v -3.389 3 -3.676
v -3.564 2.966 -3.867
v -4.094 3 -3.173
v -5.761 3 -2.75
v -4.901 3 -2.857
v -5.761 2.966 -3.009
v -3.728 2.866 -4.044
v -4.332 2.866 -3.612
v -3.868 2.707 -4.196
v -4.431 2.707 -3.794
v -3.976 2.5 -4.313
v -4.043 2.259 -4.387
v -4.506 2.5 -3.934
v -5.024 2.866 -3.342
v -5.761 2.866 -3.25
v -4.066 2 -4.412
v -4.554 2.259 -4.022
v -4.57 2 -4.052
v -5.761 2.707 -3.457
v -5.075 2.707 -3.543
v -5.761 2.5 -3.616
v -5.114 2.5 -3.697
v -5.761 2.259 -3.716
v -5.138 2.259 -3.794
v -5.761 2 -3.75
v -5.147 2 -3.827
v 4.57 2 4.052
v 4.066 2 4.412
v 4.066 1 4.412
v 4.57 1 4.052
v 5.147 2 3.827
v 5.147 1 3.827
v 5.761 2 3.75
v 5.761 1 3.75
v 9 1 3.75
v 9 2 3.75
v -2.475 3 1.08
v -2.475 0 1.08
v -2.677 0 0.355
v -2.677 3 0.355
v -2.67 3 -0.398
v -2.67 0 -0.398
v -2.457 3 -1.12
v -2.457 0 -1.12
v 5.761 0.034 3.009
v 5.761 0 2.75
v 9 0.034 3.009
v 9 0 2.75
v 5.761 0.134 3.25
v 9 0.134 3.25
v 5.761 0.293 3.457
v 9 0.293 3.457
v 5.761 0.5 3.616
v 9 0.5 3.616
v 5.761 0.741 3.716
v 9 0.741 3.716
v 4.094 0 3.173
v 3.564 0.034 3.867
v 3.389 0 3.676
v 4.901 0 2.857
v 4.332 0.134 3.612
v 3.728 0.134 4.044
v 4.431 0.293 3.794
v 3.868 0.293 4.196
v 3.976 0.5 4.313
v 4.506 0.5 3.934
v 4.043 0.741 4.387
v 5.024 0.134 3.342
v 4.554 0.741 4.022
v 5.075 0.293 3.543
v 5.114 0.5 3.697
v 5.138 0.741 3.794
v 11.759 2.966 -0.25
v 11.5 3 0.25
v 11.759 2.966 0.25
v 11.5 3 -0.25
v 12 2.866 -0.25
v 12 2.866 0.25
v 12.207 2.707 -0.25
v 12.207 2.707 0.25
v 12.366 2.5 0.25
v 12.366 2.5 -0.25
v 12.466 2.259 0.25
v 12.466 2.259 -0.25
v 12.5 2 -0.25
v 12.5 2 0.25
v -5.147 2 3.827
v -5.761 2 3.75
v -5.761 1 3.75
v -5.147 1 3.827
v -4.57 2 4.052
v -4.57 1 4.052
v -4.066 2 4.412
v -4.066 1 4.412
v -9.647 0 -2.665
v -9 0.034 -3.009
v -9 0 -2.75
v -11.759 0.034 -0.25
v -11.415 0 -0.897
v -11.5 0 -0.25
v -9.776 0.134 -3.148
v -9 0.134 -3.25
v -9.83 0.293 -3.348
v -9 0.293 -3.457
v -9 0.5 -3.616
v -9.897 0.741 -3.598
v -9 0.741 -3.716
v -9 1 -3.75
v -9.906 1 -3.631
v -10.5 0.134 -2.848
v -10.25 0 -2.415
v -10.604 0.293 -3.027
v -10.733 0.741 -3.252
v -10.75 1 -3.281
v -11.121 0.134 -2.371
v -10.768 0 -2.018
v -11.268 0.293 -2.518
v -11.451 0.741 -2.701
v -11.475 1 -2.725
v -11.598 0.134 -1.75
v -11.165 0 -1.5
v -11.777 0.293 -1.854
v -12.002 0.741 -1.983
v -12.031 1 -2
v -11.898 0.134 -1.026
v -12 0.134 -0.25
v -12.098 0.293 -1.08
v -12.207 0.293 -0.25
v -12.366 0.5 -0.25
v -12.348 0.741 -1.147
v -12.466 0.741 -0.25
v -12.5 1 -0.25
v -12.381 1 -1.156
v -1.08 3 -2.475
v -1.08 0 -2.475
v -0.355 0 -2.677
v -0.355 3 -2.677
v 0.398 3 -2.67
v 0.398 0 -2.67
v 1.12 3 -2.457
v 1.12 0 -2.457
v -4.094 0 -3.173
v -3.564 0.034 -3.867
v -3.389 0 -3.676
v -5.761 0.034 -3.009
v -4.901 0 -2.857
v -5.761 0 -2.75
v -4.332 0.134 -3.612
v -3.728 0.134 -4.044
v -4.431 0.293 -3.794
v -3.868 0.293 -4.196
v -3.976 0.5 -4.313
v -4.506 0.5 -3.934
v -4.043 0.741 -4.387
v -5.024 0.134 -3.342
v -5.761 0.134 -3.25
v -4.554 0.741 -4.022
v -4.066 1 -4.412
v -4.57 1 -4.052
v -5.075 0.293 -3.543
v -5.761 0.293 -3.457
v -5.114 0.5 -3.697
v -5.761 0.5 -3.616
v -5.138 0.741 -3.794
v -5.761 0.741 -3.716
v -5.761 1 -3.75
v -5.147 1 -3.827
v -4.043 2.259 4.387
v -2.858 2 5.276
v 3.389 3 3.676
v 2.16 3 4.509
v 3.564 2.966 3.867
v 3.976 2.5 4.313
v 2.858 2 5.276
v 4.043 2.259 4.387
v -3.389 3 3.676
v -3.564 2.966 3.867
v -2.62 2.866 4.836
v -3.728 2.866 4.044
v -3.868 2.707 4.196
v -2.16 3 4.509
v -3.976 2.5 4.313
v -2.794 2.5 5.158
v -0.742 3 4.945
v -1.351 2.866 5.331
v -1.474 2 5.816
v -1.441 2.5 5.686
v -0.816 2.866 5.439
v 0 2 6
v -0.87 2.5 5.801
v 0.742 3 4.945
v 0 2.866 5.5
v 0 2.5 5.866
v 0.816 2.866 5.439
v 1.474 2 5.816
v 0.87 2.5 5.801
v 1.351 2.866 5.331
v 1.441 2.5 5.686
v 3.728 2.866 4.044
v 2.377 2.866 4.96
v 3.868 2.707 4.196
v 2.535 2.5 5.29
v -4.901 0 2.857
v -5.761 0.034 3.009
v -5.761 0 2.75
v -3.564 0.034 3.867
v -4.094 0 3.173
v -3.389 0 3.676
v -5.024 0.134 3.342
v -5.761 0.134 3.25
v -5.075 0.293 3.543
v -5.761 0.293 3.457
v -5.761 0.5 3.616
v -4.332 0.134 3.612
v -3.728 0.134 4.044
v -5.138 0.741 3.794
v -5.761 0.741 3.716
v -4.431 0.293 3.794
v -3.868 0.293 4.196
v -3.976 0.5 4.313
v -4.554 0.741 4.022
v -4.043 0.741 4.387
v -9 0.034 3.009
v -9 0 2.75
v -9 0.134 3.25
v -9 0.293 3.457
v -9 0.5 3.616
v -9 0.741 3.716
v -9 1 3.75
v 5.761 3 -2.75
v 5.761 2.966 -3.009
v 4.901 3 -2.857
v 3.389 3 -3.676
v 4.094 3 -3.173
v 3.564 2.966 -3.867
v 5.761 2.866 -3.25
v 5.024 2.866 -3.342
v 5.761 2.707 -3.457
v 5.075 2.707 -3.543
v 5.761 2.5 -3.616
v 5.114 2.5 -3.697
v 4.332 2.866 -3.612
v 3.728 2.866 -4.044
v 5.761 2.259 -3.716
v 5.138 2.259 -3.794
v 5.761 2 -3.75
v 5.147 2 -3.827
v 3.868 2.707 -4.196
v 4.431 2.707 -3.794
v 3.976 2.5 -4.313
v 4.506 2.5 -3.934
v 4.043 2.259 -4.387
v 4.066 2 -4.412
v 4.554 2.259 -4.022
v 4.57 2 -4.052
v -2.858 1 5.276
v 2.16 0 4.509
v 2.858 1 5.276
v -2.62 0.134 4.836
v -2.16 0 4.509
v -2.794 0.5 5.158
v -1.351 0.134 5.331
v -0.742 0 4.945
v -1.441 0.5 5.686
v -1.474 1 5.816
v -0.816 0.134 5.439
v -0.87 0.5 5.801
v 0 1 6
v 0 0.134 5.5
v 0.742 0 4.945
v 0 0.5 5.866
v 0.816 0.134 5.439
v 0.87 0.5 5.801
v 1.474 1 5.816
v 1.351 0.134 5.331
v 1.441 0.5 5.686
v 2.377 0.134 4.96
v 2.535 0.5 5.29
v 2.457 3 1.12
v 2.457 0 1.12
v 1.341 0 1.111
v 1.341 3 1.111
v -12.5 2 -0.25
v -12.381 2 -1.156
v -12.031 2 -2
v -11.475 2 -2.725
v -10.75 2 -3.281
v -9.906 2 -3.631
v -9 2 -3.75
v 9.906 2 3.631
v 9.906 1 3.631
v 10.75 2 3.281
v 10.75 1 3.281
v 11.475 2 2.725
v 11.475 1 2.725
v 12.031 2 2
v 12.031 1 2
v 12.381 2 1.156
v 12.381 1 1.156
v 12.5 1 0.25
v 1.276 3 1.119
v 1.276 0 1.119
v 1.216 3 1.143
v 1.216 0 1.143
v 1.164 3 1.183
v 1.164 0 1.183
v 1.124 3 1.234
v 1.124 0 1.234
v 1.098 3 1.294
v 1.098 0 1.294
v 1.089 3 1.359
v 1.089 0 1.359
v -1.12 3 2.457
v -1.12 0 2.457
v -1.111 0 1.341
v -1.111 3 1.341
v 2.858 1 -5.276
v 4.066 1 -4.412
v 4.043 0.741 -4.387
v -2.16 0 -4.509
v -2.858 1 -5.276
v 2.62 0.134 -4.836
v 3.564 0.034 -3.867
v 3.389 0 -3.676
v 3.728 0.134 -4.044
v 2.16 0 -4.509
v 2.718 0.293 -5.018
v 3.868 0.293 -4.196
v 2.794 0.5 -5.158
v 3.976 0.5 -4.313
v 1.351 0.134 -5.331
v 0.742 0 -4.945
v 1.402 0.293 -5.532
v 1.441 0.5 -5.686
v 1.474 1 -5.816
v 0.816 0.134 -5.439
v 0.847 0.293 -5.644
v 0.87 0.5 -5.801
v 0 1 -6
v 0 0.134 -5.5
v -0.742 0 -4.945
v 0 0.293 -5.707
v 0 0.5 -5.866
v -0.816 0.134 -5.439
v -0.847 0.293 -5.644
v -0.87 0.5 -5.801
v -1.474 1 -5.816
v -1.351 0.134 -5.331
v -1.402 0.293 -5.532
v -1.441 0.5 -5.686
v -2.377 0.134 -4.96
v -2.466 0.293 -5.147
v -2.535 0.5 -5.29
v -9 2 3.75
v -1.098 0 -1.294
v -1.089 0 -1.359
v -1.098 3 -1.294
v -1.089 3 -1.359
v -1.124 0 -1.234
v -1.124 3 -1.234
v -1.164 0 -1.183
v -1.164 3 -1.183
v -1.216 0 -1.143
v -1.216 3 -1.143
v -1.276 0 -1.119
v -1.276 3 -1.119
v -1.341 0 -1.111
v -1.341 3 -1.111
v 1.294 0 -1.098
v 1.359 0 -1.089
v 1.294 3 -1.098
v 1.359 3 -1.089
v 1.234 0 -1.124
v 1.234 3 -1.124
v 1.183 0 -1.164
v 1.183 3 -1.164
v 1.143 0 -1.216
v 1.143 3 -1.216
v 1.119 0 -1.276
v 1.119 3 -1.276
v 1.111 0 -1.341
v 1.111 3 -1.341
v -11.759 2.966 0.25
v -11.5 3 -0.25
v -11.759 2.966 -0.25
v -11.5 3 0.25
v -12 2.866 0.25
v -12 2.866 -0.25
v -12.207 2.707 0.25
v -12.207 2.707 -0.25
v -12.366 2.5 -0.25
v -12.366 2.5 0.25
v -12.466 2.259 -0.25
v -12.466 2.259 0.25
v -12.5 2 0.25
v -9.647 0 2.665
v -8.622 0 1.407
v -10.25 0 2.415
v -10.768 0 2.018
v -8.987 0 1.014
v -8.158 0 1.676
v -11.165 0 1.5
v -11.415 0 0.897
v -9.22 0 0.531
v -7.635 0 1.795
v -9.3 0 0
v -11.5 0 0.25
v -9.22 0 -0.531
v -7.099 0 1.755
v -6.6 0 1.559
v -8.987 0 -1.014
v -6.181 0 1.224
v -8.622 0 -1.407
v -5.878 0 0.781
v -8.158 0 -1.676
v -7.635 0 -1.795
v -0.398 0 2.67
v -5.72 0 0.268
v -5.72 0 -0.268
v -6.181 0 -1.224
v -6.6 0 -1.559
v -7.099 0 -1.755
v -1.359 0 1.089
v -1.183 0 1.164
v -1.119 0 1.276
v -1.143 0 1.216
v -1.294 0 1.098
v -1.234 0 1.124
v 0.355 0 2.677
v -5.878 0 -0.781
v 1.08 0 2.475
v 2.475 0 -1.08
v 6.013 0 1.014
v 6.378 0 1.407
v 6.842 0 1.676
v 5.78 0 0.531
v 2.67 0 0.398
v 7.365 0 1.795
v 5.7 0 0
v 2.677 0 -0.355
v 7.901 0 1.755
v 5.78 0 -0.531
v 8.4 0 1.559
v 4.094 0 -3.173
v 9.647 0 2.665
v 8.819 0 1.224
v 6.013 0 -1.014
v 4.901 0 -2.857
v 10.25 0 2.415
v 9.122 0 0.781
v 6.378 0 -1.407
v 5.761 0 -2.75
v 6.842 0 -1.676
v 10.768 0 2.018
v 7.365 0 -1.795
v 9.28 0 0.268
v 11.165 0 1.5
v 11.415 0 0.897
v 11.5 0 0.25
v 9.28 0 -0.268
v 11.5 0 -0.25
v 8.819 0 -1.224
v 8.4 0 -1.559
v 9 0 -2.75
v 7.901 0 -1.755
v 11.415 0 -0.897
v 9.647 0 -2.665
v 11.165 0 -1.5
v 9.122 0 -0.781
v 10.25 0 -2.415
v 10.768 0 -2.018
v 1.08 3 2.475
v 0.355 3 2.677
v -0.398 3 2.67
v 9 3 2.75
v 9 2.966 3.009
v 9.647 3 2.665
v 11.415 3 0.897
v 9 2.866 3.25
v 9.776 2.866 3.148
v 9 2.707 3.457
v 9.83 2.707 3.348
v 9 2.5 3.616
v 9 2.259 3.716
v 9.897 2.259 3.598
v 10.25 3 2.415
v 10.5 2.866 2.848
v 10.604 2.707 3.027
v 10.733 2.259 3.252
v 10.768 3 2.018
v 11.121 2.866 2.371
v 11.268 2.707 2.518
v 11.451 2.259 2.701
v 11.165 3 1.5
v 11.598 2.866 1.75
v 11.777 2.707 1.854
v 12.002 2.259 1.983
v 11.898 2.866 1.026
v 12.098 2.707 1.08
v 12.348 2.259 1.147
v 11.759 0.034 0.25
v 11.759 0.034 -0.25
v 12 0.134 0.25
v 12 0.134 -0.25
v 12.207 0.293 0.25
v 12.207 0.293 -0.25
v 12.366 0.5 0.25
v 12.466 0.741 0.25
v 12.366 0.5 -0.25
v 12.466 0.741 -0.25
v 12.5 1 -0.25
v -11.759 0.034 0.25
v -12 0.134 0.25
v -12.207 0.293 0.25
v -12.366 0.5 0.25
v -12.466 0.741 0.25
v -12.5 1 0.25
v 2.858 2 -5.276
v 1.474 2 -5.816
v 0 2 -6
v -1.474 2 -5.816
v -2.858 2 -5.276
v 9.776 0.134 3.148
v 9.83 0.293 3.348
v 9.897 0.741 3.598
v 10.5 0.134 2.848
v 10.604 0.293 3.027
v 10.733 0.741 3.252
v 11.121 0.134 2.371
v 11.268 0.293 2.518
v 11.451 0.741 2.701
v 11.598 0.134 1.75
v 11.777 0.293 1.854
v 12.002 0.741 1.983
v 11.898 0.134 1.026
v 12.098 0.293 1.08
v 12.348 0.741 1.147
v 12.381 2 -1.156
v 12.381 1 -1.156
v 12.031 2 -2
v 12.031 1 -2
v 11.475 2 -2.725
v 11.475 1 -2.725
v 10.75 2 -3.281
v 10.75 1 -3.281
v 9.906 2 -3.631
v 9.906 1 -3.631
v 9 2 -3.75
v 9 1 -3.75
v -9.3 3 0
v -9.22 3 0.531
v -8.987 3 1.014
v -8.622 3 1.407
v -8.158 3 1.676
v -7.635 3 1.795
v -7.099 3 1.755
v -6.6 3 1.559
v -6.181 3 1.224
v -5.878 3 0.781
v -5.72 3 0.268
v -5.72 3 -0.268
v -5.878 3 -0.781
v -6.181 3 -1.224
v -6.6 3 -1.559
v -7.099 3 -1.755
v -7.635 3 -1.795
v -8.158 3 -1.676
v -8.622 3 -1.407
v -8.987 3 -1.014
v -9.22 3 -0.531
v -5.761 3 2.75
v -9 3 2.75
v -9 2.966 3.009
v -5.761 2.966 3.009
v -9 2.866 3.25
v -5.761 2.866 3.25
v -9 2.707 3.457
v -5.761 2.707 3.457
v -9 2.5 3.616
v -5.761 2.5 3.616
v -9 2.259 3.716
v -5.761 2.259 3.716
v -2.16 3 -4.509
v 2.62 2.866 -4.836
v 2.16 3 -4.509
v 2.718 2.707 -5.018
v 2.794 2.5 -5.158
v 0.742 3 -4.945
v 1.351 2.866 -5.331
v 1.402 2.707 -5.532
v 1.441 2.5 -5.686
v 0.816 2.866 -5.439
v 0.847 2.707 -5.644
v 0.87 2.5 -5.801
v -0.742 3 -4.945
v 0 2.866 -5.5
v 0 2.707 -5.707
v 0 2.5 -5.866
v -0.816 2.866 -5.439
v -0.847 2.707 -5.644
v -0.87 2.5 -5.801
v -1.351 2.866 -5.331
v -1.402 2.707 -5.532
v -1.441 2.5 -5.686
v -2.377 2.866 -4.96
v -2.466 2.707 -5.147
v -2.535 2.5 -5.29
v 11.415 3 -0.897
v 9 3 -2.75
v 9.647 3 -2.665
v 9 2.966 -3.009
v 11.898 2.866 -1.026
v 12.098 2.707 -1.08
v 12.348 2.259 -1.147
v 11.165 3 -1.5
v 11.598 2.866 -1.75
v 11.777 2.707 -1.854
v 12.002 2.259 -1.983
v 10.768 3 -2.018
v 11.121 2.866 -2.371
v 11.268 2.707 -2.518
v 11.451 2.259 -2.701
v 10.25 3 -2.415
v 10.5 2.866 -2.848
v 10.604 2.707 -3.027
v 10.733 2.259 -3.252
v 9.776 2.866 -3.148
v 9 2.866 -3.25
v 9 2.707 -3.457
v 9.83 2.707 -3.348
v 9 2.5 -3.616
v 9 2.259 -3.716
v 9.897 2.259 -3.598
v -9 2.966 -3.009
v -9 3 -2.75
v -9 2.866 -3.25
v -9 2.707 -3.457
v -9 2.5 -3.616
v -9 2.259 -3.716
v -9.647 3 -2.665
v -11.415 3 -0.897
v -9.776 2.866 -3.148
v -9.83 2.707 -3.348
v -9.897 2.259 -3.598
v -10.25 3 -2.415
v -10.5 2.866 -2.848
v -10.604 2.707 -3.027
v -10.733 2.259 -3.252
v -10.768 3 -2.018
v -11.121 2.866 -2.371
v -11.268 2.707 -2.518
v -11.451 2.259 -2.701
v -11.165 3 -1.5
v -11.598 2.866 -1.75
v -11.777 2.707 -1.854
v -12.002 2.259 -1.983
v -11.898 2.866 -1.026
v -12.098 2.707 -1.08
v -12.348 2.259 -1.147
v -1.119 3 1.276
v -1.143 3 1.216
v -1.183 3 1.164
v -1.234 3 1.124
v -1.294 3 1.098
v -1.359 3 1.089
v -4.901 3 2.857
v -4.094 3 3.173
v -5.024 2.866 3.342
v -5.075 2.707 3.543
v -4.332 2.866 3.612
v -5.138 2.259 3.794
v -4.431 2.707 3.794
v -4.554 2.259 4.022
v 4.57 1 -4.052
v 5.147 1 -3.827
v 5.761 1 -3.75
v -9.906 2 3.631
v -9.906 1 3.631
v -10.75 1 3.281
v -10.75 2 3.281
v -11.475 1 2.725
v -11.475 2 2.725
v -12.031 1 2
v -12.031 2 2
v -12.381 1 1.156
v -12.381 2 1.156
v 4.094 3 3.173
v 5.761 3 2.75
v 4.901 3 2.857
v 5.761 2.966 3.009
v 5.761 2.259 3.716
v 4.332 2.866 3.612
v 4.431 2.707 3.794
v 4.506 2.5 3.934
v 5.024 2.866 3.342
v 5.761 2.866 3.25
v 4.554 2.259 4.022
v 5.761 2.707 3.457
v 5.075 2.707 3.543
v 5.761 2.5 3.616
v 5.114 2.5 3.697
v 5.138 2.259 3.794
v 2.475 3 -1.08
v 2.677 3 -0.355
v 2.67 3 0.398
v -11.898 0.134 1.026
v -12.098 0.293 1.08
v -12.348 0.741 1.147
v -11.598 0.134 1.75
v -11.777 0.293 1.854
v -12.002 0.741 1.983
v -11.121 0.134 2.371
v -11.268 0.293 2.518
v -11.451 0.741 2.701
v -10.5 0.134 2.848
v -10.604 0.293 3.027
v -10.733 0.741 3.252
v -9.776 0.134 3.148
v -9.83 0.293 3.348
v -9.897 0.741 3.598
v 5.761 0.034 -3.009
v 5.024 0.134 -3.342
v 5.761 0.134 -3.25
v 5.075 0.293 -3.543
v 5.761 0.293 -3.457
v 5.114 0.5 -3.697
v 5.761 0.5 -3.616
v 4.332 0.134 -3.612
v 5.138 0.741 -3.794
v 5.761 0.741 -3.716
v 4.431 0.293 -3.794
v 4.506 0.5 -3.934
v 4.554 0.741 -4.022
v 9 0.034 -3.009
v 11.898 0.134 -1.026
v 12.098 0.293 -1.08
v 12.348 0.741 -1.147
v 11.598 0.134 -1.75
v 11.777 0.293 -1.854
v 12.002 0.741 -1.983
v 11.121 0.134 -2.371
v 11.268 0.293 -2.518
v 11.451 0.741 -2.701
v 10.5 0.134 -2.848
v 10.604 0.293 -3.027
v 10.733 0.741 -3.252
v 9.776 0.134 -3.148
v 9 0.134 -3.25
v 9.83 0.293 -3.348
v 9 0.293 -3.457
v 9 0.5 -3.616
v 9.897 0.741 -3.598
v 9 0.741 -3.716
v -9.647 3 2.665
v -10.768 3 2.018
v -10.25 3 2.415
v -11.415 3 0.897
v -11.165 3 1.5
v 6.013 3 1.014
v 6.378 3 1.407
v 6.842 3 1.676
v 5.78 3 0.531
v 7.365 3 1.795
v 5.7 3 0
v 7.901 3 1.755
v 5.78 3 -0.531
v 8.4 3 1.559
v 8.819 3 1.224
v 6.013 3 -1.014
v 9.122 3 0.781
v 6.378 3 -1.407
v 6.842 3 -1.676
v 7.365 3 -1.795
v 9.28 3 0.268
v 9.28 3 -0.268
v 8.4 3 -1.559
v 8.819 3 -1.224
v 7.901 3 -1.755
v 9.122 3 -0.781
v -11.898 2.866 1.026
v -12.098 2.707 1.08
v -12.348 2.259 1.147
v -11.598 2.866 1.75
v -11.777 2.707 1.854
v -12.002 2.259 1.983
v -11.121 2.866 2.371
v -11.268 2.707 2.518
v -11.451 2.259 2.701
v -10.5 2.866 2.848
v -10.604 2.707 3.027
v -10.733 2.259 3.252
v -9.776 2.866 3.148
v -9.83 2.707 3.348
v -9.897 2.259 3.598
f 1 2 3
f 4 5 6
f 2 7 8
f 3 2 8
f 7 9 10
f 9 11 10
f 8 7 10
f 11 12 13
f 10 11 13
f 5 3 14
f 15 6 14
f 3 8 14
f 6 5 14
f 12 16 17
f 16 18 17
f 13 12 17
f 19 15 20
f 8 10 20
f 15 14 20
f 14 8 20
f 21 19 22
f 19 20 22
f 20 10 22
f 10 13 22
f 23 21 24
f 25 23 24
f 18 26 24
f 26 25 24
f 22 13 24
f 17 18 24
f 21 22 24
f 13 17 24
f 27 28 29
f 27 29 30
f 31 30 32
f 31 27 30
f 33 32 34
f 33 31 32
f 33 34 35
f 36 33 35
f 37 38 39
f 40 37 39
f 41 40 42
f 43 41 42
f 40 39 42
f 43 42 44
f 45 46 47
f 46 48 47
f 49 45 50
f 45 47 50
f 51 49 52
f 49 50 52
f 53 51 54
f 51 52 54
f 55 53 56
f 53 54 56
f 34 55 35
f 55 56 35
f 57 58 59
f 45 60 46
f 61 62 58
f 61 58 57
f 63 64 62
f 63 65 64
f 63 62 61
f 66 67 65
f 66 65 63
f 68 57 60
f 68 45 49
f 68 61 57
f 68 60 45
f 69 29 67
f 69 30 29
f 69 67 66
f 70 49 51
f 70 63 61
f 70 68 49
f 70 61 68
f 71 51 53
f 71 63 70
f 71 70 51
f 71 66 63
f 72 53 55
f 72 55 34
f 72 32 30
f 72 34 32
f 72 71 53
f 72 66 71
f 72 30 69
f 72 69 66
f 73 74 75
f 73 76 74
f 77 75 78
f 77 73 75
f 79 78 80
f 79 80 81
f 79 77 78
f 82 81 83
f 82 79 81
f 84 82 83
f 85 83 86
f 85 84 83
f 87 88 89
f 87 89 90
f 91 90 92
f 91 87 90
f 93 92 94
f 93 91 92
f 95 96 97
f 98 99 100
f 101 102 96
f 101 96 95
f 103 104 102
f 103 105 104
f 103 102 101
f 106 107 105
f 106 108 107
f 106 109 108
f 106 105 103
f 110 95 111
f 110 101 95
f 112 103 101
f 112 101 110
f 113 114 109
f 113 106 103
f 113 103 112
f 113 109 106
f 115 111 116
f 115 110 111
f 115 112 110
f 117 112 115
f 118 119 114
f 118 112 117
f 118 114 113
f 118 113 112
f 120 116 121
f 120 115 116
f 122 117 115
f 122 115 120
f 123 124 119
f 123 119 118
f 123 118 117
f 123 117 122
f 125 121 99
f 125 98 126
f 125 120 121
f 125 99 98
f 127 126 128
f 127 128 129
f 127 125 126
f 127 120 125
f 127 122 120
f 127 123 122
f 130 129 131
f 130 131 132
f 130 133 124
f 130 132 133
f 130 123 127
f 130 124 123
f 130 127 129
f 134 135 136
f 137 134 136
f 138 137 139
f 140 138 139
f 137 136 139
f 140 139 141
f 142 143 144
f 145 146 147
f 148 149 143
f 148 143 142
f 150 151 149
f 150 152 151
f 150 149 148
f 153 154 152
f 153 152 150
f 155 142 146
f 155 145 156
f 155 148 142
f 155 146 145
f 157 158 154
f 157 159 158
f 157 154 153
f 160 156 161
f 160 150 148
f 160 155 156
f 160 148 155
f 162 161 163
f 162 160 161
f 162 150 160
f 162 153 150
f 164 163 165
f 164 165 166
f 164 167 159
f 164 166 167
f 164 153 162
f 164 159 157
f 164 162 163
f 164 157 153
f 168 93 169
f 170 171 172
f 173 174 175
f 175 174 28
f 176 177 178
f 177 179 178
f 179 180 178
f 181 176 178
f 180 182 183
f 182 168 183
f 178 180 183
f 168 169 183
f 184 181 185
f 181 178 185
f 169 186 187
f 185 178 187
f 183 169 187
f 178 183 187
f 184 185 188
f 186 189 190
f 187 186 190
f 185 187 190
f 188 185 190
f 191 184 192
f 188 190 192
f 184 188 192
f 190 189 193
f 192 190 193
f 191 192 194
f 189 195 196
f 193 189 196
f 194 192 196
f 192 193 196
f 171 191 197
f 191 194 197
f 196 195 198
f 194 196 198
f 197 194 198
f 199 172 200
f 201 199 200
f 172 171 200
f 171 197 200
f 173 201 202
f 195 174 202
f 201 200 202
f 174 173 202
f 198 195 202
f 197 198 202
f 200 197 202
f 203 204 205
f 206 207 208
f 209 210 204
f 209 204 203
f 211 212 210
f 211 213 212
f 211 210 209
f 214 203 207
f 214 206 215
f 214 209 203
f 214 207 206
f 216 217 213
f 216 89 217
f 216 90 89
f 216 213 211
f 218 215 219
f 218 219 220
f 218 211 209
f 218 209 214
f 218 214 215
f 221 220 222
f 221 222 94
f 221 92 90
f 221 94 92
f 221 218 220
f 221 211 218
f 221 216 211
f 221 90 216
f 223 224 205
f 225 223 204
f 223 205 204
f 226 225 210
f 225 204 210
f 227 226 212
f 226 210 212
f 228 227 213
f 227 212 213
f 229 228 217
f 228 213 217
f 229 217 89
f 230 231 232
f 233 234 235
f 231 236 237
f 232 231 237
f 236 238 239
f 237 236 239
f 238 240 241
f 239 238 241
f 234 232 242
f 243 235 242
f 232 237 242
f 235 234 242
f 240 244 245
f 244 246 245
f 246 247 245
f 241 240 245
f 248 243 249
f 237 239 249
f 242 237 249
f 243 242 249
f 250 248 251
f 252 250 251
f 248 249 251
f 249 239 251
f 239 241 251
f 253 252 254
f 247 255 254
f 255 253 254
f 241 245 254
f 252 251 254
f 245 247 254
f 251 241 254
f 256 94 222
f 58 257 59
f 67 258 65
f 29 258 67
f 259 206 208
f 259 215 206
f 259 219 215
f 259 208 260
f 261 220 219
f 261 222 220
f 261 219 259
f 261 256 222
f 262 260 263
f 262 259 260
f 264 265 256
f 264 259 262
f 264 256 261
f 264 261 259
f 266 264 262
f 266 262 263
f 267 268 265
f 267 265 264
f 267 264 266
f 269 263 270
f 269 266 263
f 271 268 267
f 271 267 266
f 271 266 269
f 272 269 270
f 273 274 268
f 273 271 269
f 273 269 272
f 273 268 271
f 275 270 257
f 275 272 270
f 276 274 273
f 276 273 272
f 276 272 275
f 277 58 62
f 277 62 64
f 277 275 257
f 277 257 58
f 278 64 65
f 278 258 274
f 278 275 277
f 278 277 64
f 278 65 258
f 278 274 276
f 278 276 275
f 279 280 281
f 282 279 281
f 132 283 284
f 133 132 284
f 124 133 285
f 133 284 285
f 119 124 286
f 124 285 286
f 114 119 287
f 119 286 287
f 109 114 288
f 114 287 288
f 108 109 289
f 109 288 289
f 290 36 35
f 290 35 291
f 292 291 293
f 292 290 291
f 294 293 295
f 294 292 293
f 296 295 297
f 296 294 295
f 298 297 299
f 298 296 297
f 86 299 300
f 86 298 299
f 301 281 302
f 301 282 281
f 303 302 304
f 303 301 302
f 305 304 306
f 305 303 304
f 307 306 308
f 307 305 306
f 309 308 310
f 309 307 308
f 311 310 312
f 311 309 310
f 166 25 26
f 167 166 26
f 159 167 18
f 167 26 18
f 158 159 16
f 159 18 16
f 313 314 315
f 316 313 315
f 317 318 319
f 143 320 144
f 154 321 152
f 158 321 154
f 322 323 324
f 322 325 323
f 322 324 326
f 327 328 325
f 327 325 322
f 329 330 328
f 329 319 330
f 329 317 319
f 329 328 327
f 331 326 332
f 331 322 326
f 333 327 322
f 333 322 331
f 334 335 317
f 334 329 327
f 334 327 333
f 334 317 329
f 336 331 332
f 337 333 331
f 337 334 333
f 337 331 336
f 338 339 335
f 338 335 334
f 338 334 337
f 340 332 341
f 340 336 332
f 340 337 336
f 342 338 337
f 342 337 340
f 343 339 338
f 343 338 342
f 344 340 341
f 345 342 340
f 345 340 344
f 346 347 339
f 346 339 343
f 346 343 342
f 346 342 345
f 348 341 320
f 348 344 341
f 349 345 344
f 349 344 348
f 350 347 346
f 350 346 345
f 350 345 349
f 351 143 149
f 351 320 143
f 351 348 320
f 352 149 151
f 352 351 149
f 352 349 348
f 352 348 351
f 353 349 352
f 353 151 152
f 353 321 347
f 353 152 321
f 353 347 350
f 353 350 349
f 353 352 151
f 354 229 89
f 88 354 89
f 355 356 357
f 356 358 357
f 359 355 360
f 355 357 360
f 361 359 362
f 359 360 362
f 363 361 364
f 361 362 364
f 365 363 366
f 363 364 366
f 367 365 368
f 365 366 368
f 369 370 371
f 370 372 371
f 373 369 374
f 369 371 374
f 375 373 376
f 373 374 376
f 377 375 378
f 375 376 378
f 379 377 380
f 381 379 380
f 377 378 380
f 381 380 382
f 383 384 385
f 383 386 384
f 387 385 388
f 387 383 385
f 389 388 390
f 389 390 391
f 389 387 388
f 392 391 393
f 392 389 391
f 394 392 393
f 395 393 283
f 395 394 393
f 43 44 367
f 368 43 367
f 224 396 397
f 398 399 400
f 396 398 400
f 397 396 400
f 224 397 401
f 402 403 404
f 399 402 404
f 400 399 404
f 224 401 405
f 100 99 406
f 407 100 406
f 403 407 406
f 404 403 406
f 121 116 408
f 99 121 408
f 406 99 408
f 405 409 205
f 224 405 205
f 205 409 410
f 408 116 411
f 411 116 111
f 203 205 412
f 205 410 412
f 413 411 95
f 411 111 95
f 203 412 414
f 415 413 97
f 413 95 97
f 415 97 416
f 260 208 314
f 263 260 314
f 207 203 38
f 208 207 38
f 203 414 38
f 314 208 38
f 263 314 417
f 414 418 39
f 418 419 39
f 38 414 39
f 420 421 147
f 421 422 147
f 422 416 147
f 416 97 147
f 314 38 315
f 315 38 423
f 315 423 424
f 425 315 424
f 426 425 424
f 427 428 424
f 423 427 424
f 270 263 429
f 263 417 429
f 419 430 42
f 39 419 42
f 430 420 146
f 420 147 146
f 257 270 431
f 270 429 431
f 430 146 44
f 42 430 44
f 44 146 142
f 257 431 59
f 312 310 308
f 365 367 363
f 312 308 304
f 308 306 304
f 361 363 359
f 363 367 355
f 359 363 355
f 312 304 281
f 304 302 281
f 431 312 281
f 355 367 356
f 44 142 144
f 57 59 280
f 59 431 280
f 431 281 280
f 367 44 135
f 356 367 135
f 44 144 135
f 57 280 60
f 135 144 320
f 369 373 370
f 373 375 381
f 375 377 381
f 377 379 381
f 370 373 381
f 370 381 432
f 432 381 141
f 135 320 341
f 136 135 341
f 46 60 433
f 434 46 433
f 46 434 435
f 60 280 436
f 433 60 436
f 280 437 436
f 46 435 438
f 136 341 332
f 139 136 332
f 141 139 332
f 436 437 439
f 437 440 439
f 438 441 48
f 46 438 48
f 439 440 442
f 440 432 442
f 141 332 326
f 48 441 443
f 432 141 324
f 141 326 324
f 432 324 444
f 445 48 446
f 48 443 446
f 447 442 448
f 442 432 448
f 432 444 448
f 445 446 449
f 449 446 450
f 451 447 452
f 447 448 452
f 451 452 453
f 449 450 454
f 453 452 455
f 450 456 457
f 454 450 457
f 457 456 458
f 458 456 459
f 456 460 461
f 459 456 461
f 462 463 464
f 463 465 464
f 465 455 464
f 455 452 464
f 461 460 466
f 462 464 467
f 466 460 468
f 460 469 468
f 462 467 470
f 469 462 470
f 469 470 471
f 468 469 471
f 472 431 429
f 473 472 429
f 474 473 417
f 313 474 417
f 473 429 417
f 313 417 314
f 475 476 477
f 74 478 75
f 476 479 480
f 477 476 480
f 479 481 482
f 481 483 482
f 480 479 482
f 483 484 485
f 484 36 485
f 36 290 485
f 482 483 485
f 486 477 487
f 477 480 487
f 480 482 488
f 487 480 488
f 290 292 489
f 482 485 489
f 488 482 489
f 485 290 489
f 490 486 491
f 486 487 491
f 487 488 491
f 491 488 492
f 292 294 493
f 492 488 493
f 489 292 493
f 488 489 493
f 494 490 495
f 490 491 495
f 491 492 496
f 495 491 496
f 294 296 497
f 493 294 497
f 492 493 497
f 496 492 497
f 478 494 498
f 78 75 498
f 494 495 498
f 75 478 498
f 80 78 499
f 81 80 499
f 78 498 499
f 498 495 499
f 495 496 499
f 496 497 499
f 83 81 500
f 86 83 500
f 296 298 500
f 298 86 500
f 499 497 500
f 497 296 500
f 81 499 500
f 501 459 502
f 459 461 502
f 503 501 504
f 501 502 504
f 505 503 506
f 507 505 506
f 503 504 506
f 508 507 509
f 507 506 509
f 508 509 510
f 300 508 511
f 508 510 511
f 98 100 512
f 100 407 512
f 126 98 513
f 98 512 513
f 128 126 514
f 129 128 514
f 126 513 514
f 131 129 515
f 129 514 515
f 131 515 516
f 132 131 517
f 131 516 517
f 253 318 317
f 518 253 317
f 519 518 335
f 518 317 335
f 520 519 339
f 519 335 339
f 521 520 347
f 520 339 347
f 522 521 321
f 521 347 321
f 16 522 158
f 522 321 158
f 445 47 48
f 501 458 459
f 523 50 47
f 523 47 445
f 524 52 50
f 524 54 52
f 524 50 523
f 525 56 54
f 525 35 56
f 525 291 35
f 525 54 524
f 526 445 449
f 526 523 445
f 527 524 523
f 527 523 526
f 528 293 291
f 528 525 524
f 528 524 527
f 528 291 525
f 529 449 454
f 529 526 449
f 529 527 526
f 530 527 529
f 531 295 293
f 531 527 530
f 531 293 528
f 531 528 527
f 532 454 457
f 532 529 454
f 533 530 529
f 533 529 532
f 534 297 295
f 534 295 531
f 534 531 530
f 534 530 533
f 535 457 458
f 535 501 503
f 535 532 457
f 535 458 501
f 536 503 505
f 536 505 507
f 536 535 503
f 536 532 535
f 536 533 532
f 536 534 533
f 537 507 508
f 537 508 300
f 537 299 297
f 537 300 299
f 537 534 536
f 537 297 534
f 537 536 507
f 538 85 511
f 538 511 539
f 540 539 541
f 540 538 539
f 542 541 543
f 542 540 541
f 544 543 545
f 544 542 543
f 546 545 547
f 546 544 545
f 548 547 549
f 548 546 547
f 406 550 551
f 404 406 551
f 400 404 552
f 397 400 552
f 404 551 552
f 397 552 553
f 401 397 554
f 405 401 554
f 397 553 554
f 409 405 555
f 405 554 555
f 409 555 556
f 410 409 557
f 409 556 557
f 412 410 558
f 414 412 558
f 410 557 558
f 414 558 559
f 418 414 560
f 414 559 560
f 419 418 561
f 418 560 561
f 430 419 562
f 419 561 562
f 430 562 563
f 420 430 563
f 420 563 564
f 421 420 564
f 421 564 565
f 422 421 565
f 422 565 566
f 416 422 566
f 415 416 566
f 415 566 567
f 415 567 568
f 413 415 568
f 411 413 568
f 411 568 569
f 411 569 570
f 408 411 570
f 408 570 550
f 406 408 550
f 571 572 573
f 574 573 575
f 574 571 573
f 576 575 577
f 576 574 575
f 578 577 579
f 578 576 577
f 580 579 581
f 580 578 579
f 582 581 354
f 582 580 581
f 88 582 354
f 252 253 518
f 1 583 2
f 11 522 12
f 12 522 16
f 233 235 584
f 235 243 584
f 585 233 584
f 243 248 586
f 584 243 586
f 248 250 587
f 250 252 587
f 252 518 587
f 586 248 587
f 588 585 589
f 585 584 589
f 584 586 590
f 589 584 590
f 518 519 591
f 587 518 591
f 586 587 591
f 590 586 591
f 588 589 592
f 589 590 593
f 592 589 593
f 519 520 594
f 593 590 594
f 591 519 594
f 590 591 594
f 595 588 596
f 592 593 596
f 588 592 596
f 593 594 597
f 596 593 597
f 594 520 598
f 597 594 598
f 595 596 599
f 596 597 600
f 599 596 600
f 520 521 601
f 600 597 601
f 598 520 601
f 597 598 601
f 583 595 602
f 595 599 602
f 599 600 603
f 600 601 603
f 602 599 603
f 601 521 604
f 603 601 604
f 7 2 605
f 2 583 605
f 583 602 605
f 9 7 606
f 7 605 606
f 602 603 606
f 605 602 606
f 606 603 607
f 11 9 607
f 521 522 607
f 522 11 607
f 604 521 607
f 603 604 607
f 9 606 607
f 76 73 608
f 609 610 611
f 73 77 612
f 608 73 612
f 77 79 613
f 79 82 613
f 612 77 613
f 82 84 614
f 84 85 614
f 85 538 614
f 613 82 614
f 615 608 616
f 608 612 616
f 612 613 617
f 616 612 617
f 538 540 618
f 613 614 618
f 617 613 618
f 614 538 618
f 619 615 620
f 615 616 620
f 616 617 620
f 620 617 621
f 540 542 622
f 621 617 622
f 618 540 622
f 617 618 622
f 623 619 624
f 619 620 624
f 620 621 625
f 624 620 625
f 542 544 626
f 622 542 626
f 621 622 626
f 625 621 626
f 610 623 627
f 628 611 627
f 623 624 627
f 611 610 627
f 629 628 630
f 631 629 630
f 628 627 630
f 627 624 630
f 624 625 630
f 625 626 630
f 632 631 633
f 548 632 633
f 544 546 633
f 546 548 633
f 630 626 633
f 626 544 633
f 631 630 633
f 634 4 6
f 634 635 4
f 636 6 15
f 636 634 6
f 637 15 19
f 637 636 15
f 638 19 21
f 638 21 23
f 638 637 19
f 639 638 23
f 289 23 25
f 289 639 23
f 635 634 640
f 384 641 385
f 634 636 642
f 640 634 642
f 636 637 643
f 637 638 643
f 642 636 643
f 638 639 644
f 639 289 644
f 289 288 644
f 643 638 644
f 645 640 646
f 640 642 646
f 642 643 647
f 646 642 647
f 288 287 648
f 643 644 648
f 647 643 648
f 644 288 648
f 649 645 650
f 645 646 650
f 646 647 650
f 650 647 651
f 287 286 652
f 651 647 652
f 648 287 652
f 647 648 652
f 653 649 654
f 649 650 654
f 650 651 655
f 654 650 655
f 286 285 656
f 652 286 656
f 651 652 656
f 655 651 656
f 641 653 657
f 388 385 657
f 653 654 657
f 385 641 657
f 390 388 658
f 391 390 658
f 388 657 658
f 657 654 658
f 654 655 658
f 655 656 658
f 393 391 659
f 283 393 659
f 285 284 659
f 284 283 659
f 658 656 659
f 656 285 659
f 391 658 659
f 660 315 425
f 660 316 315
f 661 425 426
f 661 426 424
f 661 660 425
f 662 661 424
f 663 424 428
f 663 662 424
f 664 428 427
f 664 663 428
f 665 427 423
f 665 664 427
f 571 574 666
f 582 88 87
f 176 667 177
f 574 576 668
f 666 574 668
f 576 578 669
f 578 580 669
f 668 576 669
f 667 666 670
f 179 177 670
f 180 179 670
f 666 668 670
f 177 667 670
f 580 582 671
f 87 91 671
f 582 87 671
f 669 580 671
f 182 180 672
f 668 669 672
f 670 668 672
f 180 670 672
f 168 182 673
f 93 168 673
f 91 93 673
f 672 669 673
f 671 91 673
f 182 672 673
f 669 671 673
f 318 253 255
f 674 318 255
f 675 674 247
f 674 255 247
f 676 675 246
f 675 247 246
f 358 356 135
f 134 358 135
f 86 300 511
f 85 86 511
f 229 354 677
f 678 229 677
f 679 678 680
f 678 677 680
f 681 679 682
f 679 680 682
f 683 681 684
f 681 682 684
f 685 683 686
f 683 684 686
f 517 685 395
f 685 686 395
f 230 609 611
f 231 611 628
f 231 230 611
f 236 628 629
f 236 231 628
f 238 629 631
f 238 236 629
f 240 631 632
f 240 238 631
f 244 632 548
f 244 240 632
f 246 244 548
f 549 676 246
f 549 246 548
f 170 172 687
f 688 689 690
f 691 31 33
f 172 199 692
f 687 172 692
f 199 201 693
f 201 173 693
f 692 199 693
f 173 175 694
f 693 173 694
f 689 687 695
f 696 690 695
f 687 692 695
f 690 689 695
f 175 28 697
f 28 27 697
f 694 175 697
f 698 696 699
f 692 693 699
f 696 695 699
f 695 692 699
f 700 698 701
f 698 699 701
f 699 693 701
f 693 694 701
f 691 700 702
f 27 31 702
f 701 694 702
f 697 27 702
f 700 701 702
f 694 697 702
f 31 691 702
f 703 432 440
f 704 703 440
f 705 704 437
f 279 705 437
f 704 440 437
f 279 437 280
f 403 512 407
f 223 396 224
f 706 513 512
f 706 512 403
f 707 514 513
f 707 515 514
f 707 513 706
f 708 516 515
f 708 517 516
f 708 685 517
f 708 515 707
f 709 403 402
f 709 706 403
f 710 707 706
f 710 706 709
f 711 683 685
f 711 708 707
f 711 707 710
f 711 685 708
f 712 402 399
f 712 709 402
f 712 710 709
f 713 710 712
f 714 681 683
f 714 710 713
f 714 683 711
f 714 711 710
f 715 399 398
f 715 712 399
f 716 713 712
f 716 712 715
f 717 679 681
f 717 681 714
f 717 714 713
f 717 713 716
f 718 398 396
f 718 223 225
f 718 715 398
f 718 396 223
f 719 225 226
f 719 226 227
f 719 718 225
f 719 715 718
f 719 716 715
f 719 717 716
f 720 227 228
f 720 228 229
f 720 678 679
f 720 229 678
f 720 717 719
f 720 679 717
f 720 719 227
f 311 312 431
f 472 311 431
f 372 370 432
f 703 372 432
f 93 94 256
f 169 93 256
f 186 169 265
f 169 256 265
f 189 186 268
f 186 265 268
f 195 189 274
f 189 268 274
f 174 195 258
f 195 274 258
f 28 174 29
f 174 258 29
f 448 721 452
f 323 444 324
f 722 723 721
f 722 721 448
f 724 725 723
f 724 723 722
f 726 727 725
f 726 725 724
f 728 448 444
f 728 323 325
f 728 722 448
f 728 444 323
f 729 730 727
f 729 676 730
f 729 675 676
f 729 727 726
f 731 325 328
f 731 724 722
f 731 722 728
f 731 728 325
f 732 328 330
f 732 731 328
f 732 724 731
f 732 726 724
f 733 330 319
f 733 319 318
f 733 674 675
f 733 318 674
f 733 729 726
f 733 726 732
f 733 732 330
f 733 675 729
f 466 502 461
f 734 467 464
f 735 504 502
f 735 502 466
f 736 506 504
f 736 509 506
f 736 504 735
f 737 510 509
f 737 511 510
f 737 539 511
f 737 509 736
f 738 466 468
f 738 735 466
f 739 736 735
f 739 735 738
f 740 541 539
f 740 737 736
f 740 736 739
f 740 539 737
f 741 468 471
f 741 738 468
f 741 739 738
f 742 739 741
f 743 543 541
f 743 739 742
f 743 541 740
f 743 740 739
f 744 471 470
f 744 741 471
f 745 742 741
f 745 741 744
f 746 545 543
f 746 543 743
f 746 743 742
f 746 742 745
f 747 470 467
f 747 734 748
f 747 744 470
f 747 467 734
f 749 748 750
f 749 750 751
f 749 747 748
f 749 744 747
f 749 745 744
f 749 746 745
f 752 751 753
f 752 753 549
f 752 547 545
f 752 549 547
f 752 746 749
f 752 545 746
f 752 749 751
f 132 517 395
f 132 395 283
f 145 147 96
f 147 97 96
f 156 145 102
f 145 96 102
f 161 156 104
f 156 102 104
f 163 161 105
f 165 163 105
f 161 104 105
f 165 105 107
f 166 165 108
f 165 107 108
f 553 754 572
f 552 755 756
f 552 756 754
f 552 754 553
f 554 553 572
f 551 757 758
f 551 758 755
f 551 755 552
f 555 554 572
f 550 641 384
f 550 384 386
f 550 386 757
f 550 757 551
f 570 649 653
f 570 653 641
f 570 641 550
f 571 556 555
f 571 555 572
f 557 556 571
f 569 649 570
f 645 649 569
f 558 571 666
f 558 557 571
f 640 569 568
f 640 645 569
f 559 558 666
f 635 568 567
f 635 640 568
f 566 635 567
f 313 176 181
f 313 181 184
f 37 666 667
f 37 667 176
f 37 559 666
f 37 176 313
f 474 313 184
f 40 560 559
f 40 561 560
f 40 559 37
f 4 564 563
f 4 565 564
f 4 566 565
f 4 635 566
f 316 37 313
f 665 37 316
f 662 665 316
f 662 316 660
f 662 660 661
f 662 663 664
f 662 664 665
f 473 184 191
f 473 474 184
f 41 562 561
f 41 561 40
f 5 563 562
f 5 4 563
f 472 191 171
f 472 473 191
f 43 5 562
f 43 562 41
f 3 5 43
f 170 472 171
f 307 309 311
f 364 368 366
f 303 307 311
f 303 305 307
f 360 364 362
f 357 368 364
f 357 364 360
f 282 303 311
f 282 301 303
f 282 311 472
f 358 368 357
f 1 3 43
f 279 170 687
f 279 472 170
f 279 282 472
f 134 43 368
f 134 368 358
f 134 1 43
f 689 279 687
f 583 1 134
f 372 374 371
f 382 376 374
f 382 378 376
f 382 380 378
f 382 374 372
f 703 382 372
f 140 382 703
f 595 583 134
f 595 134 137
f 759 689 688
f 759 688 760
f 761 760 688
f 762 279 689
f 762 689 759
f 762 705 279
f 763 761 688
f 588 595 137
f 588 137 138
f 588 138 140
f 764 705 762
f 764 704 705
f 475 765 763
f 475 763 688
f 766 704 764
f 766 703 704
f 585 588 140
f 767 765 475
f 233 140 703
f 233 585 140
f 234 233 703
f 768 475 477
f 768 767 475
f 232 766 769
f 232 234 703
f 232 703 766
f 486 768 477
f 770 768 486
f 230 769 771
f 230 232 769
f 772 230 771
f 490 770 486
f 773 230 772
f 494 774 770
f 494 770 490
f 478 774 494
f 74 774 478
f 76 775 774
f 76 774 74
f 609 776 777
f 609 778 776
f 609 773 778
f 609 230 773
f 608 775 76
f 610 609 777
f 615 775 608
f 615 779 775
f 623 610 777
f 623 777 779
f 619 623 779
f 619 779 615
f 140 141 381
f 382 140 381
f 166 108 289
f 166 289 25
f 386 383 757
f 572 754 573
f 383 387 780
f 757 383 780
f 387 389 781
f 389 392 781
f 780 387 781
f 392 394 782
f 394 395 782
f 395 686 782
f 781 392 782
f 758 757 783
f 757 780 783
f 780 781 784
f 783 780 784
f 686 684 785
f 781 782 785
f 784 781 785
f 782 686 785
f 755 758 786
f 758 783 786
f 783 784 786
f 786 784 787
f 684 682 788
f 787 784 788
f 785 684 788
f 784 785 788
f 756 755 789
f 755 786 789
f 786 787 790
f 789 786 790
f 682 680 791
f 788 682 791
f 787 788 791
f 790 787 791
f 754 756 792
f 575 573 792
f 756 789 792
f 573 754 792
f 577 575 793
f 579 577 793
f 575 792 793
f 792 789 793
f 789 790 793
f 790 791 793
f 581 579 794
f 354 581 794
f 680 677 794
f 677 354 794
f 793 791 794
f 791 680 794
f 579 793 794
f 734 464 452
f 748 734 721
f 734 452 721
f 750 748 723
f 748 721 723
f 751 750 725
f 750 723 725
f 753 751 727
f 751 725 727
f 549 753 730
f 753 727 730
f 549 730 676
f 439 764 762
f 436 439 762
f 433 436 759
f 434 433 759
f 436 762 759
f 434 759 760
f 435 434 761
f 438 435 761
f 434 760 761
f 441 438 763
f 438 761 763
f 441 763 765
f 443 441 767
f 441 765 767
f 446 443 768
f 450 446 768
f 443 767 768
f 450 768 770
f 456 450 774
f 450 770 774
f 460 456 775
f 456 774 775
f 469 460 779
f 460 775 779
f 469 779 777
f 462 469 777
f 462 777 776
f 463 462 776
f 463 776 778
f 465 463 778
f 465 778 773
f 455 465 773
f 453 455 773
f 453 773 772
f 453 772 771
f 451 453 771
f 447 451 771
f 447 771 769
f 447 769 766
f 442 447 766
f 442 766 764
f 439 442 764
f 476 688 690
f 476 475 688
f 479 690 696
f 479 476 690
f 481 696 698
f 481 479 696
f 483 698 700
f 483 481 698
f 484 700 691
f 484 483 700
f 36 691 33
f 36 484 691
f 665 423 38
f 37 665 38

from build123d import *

# Parameters (mm, degrees)
SKETCH1_W            = 25
SKETCH1_H            = 7.5
BOSS_EXTRUDE1_DEPTH  = 3
CUT_EXTRUDE2_DEPTH   = 4
BOSS_EXTRUDE2_DEPTH  = 3
FILLET8_R            = 2.5
FILLET4_R            = 3.5
M3_CLEARANCE_HOLE1_D = 3.6
FILLET6_R            = 1
FILLET7_R            = 0.25


with BuildPart() as part:
    # Sketch1 → Boss-Extrude1 (new body)
    with BuildSketch(Plane(origin=(0, 0, 0), x_dir=(1, 0, 0), z_dir=(0, 1, 0))):
        Rectangle(SKETCH1_W, SKETCH1_H)
    extrude(amount=BOSS_EXTRUDE1_DEPTH)

    # Sketch1<3> → Cut-Extrude2 (cut, through all)
    with BuildSketch(Plane(origin=(0, 0, 0), x_dir=(1, 0, 0), z_dir=(0, 1, 0))):
        with BuildLine():
            Line((2.456770065, -1.119946806), (1.091049314, -1.10887844))
            Line((1.091049314, -1.10887844), (1.079980948, -2.47459919))
            ThreePointArc((1.079980948, -2.47459919), (-0.021881199, -2.699911334), (-1.119946806, -2.456770065))
            Line((-1.119946806, -2.456770065), (-1.10887844, -1.091049314))
            Line((-1.10887844, -1.091049314), (-2.47459919, -1.079980948))
            ThreePointArc((-2.47459919, -1.079980948), (-2.699911334, 0.021881199), (-2.456770065, 1.119946806))
            Line((-2.456770065, 1.119946806), (-1.091049314, 1.10887844))
            Line((-1.091049314, 1.10887844), (-1.079980948, 2.47459919))
            ThreePointArc((-1.079980948, 2.47459919), (0.021881199, 2.699911334), (1.119946806, 2.456770065))
            Line((1.119946806, 2.456770065), (1.10887844, 1.091049314))
            Line((1.10887844, 1.091049314), (2.47459919, 1.079980948))
            ThreePointArc((2.47459919, 1.079980948), (2.699911334, -0.021881199), (2.456770065, -1.119946806))
        make_face()
        with BuildLine():
            ThreePointArc((-0.818311322, -2.256184075), (-0.019449955, -2.399921186), (0.781636135, -2.269150712))
            Line((0.781636135, -2.269150712), (0.79349041, -0.806457047))
            Line((0.79349041, -0.806457047), (2.256184075, -0.818311322))
            ThreePointArc((2.256184075, -0.818311322), (2.399921186, -0.019449955), (2.269150712, 0.781636135))
            Line((2.269150712, 0.781636135), (0.806457047, 0.79349041))
            Line((0.806457047, 0.79349041), (0.818311322, 2.256184075))
            ThreePointArc((0.818311322, 2.256184075), (0.019449955, 2.399921186), (-0.781636135, 2.269150712))
            Line((-0.781636135, 2.269150712), (-0.79349041, 0.806457047))
            Line((-0.79349041, 0.806457047), (-2.256184075, 0.818311322))
            ThreePointArc((-2.256184075, 0.818311322), (-2.399921186, 0.019449955), (-2.269150712, -0.781636135))
            Line((-2.269150712, -0.781636135), (-0.806457047, -0.79349041))
            Line((-0.806457047, -0.79349041), (-0.818311322, -2.256184075))
        make_face(mode=Mode.SUBTRACT)
        with BuildLine():
            Line((-0.818311322, -2.256184075), (-0.806457047, -0.79349041))
            Line((-0.806457047, -0.79349041), (-2.269150712, -0.781636135))
            ThreePointArc((-2.269150712, -0.781636135), (-2.399921186, 0.019449955), (-2.256184075, 0.818311322))
            Line((-2.256184075, 0.818311322), (-0.79349041, 0.806457047))
            Line((-0.79349041, 0.806457047), (-0.781636135, 2.269150712))
            ThreePointArc((-0.781636135, 2.269150712), (0.019449955, 2.399921186), (0.818311322, 2.256184075))
            Line((0.818311322, 2.256184075), (0.806457047, 0.79349041))
            Line((0.806457047, 0.79349041), (2.269150712, 0.781636135))
            ThreePointArc((2.269150712, 0.781636135), (2.399921186, -0.019449955), (2.256184075, -0.818311322))
            Line((2.256184075, -0.818311322), (0.79349041, -0.806457047))
            Line((0.79349041, -0.806457047), (0.781636135, -2.269150712))
            ThreePointArc((0.781636135, -2.269150712), (-0.019449955, -2.399921186), (-0.818311322, -2.256184075))
        make_face()
    extrude(amount=CUT_EXTRUDE2_DEPTH, mode=Mode.SUBTRACT)

    # Sketch4 → Boss-Extrude2 (add)
    with BuildSketch(Plane(origin=(0, 0, 0), x_dir=(1, 0, 0), z_dir=(0, 1, 0))):
        with BuildLine():
            Line((-4.683748499, 3.75), (4.683748499, 3.75))
            ThreePointArc((4.683748499, 3.75), (0, 6), (-4.683748499, 3.75))
        make_face()
        with BuildLine():
            ThreePointArc((-4.683748499, -3.75), (0, -6), (4.683748499, -3.75))
            Line((4.683748499, -3.75), (-4.683748499, -3.75))
        make_face()
    extrude(amount=BOSS_EXTRUDE2_DEPTH)

    # Fillet8
    fillet8_edges = [part.edges().sort_by_distance(p)[0] for p in [
        (-4.683748499, 1.5, -3.75),
        (4.683748499, 1.5, -3.75),
        (4.683748499, 1.5, 3.75),
        (-4.683748499, 1.5, 3.75),
    ]]
    fillet(fillet8_edges, radius=FILLET8_R)

    # Fillet4
    fillet4_edges = [part.edges().sort_by_distance(p)[0] for p in [
        (-12.5, 1.5, 3.75),
        (-12.5, 1.5, -3.75),
        (12.5, 1.5, 3.75),
        (12.5, 1.5, -3.75),
    ]]
    fillet(fillet4_edges, radius=FILLET4_R)

    # M3 Clearance Hole1 (through all)
    with Locations(Plane.XZ):
        with Locations((-7.5, 0), (7.5, 0)):
            Hole(M3_CLEARANCE_HOLE1_D / 2)

    # Fillet6
    fillet6_edges = [part.edges().sort_by_distance(p)[0] for p in [
        (0, 3, 6),
        (0, 0, 6),
        (7.380429655, 0, 3.75),
        (7.380429655, 3, 3.75),
        (0, 3, -6),
        (0, 0, -6),
        (7.380429655, 0, -3.75),
        (7.380429655, 3, -3.75),
        (-4.851350717, 0, 3.921310644),
        (-4.851350717, 3, 3.921310644),
        (4.851350717, 0, 3.921310644),
        (4.851350717, 3, 3.921310644),
        (4.851350717, 0, -3.921310644),
        (4.851350717, 3, -3.921310644),
        (-4.851350717, 0, -3.921310644),
        (-4.851350717, 3, -3.921310644),
        (-7.380429655, 0, 3.75),
        (-12.5, 0, 0),
        (-7.380429655, 0, -3.75),
        (12.5, 0, 0),
        (-11.474873734, 0, -2.724873734),
        (-11.474873734, 0, 2.724873734),
        (11.474873734, 0, 2.724873734),
        (11.474873734, 0, -2.724873734),
        (12.5, 3, 0),
        (-7.380429655, 3, 3.75),
        (-7.380429655, 3, -3.75),
        (-12.5, 3, 0),
        (-11.474873734, 3, -2.724873734),
        (-11.474873734, 3, 2.724873734),
        (11.474873734, 3, 2.724873734),
        (11.474873734, 3, -2.724873734),
    ]]
    fillet(fillet6_edges, radius=FILLET6_R)

    # Fillet7
    fillet7_edges = [part.edges().sort_by_distance(p)[0] for p in [
        (1.091049314, 1.5, 1.10887844),
        (1.10887844, 1.5, -1.091049314),
        (-1.091049314, 1.5, -1.10887844),
        (-1.10887844, 1.5, 1.091049314),
    ]]
    fillet(fillet7_edges, radius=FILLET7_R)


solid = part.part
